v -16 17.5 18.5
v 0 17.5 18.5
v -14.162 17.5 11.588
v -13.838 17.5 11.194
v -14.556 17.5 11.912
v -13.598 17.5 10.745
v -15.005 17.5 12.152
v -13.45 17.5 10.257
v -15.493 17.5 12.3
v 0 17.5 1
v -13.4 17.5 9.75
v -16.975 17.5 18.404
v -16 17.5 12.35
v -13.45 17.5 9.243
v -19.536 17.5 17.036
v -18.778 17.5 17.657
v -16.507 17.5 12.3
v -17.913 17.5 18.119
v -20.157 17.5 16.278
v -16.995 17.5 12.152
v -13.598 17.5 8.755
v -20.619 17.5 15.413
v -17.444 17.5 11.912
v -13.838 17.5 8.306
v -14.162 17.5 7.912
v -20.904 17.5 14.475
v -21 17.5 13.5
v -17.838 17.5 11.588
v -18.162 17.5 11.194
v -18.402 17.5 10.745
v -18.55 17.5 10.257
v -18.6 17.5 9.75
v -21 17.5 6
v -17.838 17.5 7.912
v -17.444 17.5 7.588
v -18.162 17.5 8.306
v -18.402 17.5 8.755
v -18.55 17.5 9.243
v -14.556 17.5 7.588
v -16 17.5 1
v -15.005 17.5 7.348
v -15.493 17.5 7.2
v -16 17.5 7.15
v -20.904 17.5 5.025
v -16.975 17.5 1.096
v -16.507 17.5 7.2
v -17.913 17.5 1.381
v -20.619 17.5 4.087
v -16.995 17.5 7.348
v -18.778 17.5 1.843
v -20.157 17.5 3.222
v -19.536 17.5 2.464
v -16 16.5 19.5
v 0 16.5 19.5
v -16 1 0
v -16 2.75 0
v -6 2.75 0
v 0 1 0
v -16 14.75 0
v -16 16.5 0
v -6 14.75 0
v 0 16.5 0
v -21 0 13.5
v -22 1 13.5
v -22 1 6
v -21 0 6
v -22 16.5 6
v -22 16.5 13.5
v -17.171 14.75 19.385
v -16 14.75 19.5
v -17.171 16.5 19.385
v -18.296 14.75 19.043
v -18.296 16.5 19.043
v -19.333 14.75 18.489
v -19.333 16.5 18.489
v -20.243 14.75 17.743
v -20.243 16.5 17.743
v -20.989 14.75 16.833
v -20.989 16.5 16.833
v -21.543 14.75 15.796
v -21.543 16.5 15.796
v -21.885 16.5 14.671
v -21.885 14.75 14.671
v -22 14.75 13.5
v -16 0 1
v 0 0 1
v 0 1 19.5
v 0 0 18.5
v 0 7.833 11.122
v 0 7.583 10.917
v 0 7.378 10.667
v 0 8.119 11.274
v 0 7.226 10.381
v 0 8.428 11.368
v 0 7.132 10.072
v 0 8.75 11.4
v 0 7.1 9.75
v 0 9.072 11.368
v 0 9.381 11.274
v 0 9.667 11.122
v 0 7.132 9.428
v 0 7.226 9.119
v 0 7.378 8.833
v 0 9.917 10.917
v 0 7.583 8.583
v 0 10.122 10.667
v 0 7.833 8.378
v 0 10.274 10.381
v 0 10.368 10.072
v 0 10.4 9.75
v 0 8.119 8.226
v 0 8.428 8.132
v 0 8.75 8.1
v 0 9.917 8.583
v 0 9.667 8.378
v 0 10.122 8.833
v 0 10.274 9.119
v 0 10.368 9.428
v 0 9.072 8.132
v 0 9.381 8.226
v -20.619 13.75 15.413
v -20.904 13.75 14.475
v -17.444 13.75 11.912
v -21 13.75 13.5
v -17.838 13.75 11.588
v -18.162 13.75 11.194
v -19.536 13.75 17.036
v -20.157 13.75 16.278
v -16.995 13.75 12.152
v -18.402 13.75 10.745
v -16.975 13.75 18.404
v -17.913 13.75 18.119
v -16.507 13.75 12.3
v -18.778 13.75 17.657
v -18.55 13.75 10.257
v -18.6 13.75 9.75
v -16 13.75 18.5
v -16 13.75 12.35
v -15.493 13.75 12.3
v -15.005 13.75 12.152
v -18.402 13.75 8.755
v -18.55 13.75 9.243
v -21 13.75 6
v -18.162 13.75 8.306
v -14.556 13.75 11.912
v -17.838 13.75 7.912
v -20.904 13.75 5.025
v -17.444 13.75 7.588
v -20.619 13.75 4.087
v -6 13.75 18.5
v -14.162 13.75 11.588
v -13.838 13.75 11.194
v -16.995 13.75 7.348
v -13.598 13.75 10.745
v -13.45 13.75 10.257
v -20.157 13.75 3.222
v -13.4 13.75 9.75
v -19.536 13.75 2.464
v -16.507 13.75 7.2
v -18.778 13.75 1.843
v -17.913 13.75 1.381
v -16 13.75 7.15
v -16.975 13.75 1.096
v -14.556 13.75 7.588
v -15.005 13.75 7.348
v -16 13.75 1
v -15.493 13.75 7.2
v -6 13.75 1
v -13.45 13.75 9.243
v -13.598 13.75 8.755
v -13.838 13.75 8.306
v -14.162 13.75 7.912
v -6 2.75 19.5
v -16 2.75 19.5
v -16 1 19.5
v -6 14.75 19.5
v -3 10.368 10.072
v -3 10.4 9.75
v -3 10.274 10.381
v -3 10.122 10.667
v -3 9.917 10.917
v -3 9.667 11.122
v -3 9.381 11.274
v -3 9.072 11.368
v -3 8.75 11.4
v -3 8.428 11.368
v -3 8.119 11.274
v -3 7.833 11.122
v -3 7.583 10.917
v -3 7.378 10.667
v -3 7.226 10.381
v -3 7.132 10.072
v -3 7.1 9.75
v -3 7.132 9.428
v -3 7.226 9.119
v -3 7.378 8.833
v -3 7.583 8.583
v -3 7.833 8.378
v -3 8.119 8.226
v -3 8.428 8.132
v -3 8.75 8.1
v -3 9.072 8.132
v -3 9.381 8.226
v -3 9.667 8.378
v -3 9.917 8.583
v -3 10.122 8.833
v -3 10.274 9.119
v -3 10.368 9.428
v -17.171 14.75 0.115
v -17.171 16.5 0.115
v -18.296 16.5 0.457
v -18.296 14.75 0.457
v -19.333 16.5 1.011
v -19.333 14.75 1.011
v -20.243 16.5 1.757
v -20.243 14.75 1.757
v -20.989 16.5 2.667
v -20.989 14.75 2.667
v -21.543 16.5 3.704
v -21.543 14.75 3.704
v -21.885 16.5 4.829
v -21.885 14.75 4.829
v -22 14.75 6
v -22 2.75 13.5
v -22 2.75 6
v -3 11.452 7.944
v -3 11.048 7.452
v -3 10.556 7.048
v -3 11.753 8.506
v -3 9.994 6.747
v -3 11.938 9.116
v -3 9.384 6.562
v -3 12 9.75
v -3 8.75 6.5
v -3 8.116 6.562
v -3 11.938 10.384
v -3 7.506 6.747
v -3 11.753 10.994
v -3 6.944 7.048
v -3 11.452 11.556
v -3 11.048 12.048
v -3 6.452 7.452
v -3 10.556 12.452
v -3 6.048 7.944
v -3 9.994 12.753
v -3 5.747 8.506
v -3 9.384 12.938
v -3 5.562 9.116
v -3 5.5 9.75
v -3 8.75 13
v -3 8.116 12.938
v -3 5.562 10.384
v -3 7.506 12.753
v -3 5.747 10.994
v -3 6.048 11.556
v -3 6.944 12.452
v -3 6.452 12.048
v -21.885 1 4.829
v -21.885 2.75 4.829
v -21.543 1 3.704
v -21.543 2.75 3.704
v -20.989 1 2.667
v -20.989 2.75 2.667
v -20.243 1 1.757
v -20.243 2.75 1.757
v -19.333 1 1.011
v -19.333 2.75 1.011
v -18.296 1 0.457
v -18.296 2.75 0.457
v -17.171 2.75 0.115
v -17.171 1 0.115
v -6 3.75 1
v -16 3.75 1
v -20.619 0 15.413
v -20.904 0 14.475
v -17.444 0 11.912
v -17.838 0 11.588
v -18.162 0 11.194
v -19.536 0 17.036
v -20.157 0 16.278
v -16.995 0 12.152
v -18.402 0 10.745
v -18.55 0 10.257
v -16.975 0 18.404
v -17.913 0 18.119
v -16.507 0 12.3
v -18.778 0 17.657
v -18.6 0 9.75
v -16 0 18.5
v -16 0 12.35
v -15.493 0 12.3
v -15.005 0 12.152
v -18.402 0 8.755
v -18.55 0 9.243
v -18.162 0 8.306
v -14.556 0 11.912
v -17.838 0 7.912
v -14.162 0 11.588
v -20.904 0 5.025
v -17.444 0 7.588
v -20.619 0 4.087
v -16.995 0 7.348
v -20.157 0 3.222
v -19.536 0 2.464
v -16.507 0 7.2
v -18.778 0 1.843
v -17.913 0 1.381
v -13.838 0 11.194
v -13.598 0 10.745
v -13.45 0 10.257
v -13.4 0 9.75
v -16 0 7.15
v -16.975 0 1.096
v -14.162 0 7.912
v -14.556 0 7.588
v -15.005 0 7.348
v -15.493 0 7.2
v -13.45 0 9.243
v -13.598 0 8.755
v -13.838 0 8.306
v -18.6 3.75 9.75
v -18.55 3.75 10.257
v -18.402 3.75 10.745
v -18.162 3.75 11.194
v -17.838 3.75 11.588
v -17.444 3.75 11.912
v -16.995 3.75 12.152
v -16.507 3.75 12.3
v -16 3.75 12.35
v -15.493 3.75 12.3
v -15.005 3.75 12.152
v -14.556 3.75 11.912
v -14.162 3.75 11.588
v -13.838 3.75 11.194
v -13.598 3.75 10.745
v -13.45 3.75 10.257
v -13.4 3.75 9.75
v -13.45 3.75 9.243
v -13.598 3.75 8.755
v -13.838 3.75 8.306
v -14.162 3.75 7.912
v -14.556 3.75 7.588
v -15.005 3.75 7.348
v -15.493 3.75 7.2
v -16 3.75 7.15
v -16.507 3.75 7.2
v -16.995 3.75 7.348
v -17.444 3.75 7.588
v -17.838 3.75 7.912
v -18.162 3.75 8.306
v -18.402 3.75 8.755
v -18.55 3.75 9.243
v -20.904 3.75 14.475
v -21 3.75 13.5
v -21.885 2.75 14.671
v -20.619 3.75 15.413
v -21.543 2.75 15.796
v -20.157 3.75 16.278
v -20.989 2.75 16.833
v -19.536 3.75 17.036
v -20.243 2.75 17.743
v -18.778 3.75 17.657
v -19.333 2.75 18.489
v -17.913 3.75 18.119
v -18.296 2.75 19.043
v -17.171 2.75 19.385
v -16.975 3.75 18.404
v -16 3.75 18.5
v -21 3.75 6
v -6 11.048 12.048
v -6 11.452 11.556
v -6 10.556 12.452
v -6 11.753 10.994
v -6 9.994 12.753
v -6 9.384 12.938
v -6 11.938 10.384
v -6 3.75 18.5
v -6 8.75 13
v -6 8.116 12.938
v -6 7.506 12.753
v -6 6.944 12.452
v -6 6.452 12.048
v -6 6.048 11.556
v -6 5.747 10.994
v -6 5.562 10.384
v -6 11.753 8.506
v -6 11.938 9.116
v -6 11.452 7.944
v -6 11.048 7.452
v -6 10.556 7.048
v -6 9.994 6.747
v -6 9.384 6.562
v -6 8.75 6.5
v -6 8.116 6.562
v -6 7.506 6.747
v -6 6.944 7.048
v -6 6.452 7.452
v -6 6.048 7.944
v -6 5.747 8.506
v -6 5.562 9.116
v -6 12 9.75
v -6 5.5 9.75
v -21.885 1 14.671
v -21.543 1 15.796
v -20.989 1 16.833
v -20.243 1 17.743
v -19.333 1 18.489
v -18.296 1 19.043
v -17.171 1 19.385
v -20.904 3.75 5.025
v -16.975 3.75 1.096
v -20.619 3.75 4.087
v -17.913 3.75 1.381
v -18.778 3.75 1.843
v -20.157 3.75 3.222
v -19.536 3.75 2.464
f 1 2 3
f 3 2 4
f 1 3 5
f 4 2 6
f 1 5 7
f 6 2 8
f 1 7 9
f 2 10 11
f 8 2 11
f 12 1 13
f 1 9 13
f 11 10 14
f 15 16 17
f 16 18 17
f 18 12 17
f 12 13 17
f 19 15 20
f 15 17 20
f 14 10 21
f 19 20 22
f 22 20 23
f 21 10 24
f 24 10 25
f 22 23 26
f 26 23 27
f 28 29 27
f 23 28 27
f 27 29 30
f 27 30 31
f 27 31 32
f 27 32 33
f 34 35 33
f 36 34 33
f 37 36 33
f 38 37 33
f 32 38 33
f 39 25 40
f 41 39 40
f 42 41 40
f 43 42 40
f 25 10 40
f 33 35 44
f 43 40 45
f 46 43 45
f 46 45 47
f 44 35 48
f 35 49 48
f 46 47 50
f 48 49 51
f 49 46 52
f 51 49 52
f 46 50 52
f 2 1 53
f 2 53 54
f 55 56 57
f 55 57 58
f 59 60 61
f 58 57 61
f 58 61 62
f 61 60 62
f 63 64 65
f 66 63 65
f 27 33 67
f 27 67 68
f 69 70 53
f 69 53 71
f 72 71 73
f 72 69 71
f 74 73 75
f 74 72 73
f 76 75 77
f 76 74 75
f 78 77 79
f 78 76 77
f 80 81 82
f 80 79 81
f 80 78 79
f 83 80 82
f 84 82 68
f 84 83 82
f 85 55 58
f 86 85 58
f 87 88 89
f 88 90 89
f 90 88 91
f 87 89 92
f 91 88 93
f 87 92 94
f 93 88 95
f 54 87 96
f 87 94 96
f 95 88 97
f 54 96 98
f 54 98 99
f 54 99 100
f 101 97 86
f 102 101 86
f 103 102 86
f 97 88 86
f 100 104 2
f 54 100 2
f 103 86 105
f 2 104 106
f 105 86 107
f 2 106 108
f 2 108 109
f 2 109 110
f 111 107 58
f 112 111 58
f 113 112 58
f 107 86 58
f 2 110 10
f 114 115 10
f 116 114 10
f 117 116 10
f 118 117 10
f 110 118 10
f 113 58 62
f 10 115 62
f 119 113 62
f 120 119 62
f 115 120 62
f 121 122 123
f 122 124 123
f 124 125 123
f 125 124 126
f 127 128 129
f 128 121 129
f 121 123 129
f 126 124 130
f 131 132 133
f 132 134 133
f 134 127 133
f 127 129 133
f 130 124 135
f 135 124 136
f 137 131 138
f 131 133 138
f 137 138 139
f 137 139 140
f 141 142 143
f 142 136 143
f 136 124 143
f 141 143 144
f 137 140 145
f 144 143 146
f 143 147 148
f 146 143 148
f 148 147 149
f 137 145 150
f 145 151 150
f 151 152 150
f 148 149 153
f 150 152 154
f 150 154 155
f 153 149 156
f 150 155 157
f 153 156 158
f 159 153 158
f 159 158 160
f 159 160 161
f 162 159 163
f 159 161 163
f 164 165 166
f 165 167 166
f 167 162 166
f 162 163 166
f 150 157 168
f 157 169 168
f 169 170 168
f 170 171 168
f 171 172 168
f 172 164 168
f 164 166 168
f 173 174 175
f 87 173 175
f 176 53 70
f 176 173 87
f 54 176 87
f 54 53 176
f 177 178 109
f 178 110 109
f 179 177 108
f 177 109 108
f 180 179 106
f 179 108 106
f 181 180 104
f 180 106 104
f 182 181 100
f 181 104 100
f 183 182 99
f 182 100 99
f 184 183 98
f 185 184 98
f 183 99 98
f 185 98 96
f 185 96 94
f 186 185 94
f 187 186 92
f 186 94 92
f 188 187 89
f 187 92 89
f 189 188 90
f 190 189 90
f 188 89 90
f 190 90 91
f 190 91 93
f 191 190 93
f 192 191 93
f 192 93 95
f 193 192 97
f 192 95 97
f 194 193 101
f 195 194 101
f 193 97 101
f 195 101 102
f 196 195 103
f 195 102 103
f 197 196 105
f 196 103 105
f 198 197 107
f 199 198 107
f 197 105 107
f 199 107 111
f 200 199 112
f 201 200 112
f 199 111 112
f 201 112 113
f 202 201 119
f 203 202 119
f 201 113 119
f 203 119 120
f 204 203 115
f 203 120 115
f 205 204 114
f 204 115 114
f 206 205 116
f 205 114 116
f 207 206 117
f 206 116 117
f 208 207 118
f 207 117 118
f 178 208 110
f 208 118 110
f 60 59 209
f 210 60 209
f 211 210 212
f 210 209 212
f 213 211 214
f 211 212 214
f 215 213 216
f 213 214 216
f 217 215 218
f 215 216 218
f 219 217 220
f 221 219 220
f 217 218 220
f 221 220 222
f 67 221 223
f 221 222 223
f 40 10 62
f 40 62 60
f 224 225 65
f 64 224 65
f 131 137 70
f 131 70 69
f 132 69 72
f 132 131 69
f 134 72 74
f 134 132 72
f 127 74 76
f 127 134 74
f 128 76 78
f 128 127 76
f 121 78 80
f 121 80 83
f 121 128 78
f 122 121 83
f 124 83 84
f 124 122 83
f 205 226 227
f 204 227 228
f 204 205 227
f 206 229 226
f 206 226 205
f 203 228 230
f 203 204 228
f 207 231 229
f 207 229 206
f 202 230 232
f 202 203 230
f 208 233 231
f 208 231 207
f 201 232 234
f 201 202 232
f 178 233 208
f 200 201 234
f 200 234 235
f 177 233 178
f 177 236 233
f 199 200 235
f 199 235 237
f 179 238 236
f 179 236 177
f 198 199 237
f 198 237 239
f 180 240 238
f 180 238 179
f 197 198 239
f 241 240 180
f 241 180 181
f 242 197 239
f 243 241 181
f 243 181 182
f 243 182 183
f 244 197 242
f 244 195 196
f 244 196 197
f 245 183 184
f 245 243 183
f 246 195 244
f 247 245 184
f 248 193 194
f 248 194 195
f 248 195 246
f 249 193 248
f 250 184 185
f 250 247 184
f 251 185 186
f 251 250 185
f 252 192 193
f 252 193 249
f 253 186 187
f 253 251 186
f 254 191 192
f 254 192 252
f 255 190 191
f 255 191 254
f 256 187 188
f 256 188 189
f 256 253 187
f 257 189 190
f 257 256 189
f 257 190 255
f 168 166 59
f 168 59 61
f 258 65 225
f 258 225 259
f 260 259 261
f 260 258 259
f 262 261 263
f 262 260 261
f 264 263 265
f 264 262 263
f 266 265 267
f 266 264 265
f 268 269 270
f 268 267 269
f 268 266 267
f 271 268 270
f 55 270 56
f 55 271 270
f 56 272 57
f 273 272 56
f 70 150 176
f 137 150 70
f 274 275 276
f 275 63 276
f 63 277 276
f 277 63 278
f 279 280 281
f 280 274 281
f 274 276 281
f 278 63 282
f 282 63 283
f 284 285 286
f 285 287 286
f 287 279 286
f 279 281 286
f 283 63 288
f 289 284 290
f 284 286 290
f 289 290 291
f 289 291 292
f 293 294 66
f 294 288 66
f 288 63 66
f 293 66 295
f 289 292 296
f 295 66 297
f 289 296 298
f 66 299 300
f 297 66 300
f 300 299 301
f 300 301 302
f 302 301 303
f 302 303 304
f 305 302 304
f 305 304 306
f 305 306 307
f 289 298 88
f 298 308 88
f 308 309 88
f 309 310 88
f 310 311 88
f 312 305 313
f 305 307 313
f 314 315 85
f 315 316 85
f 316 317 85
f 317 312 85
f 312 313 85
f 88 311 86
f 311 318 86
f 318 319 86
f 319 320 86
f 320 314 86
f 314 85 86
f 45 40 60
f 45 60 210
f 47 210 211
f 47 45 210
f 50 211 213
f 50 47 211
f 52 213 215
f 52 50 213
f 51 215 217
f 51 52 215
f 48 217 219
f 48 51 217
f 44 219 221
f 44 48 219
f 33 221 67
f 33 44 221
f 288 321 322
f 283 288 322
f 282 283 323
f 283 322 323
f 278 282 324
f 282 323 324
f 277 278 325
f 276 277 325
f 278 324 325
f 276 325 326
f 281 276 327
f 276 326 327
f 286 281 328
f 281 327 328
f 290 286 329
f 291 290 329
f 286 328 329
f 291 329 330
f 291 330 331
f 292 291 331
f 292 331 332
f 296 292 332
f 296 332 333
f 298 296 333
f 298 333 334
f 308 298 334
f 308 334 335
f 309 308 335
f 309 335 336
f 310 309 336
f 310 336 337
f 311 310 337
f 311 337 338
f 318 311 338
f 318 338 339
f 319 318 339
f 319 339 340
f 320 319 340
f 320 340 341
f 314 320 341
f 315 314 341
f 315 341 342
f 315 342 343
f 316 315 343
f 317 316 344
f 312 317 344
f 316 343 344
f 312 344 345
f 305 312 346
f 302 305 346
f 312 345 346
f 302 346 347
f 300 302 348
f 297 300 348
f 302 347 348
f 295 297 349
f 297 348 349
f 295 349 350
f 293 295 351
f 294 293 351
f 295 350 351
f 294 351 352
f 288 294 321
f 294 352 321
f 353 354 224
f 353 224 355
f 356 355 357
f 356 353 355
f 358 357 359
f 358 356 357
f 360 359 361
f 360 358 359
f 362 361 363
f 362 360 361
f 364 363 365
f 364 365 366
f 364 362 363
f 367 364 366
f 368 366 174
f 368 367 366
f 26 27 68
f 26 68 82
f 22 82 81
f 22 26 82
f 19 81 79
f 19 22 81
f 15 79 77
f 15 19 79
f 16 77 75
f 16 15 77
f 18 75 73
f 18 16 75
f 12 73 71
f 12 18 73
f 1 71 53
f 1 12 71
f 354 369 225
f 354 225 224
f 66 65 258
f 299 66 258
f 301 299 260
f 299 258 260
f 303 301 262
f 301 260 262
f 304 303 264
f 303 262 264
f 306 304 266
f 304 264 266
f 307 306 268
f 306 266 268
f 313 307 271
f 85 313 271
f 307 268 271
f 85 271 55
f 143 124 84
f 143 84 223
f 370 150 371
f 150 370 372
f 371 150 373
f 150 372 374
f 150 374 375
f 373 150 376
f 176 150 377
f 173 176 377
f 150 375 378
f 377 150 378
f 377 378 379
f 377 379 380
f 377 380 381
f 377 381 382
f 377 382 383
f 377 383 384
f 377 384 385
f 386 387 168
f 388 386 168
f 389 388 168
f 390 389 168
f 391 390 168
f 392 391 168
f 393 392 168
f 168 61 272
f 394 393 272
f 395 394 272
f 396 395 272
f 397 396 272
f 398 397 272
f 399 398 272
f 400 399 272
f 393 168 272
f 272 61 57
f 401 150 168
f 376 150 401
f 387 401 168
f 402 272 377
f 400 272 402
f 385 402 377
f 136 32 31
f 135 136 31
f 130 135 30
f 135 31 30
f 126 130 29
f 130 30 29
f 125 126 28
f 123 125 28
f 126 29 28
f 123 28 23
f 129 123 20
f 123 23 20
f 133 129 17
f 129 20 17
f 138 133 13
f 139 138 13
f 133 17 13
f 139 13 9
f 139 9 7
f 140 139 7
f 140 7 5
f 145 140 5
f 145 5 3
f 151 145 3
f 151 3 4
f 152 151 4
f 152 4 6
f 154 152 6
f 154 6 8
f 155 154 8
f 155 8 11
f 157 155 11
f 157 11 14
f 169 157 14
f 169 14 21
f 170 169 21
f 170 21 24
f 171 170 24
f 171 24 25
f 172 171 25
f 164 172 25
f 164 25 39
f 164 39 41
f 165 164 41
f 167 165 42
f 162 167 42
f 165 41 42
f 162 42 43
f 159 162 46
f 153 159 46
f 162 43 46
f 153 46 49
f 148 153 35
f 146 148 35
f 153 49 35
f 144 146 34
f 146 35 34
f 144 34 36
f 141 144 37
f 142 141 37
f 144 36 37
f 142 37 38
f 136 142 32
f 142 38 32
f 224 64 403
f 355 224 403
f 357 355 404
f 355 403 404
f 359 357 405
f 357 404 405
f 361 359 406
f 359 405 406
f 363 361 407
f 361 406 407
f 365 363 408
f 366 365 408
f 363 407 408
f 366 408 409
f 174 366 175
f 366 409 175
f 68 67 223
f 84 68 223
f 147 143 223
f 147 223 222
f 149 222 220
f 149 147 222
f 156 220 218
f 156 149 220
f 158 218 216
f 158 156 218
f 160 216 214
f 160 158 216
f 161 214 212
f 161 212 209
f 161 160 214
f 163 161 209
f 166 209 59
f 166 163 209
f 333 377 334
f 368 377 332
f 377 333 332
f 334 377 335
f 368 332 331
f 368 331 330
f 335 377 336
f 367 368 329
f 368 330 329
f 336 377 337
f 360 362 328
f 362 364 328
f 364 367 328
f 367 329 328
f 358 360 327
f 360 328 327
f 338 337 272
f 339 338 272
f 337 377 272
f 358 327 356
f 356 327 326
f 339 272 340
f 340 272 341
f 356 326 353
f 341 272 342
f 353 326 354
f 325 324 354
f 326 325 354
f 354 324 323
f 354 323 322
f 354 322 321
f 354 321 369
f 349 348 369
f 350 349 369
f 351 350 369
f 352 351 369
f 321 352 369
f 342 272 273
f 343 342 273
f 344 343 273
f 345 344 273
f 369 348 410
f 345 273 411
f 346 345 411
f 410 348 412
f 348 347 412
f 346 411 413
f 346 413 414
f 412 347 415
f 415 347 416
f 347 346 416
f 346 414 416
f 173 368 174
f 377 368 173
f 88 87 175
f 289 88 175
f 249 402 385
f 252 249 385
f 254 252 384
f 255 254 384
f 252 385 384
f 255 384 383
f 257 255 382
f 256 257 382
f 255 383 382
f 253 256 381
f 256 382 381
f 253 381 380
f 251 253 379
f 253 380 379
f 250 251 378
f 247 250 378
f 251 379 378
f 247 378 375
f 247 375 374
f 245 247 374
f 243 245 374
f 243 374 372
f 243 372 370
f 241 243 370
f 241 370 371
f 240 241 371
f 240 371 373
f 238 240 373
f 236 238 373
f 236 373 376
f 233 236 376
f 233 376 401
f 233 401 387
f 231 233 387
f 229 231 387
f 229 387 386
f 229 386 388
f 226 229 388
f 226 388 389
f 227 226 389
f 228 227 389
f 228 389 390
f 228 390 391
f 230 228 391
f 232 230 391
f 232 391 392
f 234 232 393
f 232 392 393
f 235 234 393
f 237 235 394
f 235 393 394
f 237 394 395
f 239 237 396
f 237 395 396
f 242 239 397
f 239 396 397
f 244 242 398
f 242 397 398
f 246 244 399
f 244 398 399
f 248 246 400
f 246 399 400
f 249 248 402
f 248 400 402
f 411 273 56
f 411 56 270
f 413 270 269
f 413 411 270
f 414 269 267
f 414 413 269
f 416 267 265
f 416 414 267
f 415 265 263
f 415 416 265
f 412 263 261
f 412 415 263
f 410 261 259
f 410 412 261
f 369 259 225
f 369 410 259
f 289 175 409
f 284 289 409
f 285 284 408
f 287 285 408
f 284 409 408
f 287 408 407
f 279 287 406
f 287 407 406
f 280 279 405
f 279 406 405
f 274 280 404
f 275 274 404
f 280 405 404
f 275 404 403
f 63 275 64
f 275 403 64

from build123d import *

# Parameters (mm, degrees)
F1_DEPTH       = 19.5
F2_R           = 2.6
F3_DEPTH       = 17.501
F5_D           = 3.3
F5_CBORE_D     = 6.5
F5_CBORE_DEPTH = 3
F6_R           = 6
F7_SIZE        = 1


with BuildPart() as f1:
    # F0 (on Top) → F1 (new body)
    with BuildSketch(Plane.XY):
        Polygon((-22, 0), (0, 0), (0, 17.5), (-22, 17.5), (-22, 13.75), (-6, 13.75), (-6, 3.75), (-22, 3.75), align=None)
    extrude(amount=F1_DEPTH)

    # F2 (on face) → F3 (cut, through all)
    with BuildSketch(Plane(origin=(0, 17.5, 0), x_dir=(-1, 0, 0), z_dir=(0, 1, 0))):
        with Locations((16, 9.75)):
            Circle(F2_R)
    extrude(amount=-F3_DEPTH, mode=Mode.SUBTRACT)

    # F5 (through all)
    with Locations(Plane(origin=(-6, 0, 0), x_dir=(0, -1, 0), z_dir=(-1, 0, 0))):
        with Locations((-8.75, 9.75)):
            CounterBoreHole(F5_D / 2, F5_CBORE_D / 2, F5_CBORE_DEPTH)

    # F6
    f6_edges = [f1.edges().sort_by_distance(p)[0] for p in [
        (-22, 15.625, 0),
        (-22, 15.625, 19.5),
        (-22, 1.875, 19.5),
        (-22, 1.875, 0),
    ]]
    fillet(f6_edges, radius=F6_R)

    # F7
    f7_edges = [f1.edges().sort_by_distance(p)[0] for p in [
        (-8, 17.5, 0),
        (-8, 0, 0),
        (-11, 3.75, 0),
        (-11, 13.75, 0),
    ]]
    chamfer(f7_edges, length=F7_SIZE)


solid = f1.part
